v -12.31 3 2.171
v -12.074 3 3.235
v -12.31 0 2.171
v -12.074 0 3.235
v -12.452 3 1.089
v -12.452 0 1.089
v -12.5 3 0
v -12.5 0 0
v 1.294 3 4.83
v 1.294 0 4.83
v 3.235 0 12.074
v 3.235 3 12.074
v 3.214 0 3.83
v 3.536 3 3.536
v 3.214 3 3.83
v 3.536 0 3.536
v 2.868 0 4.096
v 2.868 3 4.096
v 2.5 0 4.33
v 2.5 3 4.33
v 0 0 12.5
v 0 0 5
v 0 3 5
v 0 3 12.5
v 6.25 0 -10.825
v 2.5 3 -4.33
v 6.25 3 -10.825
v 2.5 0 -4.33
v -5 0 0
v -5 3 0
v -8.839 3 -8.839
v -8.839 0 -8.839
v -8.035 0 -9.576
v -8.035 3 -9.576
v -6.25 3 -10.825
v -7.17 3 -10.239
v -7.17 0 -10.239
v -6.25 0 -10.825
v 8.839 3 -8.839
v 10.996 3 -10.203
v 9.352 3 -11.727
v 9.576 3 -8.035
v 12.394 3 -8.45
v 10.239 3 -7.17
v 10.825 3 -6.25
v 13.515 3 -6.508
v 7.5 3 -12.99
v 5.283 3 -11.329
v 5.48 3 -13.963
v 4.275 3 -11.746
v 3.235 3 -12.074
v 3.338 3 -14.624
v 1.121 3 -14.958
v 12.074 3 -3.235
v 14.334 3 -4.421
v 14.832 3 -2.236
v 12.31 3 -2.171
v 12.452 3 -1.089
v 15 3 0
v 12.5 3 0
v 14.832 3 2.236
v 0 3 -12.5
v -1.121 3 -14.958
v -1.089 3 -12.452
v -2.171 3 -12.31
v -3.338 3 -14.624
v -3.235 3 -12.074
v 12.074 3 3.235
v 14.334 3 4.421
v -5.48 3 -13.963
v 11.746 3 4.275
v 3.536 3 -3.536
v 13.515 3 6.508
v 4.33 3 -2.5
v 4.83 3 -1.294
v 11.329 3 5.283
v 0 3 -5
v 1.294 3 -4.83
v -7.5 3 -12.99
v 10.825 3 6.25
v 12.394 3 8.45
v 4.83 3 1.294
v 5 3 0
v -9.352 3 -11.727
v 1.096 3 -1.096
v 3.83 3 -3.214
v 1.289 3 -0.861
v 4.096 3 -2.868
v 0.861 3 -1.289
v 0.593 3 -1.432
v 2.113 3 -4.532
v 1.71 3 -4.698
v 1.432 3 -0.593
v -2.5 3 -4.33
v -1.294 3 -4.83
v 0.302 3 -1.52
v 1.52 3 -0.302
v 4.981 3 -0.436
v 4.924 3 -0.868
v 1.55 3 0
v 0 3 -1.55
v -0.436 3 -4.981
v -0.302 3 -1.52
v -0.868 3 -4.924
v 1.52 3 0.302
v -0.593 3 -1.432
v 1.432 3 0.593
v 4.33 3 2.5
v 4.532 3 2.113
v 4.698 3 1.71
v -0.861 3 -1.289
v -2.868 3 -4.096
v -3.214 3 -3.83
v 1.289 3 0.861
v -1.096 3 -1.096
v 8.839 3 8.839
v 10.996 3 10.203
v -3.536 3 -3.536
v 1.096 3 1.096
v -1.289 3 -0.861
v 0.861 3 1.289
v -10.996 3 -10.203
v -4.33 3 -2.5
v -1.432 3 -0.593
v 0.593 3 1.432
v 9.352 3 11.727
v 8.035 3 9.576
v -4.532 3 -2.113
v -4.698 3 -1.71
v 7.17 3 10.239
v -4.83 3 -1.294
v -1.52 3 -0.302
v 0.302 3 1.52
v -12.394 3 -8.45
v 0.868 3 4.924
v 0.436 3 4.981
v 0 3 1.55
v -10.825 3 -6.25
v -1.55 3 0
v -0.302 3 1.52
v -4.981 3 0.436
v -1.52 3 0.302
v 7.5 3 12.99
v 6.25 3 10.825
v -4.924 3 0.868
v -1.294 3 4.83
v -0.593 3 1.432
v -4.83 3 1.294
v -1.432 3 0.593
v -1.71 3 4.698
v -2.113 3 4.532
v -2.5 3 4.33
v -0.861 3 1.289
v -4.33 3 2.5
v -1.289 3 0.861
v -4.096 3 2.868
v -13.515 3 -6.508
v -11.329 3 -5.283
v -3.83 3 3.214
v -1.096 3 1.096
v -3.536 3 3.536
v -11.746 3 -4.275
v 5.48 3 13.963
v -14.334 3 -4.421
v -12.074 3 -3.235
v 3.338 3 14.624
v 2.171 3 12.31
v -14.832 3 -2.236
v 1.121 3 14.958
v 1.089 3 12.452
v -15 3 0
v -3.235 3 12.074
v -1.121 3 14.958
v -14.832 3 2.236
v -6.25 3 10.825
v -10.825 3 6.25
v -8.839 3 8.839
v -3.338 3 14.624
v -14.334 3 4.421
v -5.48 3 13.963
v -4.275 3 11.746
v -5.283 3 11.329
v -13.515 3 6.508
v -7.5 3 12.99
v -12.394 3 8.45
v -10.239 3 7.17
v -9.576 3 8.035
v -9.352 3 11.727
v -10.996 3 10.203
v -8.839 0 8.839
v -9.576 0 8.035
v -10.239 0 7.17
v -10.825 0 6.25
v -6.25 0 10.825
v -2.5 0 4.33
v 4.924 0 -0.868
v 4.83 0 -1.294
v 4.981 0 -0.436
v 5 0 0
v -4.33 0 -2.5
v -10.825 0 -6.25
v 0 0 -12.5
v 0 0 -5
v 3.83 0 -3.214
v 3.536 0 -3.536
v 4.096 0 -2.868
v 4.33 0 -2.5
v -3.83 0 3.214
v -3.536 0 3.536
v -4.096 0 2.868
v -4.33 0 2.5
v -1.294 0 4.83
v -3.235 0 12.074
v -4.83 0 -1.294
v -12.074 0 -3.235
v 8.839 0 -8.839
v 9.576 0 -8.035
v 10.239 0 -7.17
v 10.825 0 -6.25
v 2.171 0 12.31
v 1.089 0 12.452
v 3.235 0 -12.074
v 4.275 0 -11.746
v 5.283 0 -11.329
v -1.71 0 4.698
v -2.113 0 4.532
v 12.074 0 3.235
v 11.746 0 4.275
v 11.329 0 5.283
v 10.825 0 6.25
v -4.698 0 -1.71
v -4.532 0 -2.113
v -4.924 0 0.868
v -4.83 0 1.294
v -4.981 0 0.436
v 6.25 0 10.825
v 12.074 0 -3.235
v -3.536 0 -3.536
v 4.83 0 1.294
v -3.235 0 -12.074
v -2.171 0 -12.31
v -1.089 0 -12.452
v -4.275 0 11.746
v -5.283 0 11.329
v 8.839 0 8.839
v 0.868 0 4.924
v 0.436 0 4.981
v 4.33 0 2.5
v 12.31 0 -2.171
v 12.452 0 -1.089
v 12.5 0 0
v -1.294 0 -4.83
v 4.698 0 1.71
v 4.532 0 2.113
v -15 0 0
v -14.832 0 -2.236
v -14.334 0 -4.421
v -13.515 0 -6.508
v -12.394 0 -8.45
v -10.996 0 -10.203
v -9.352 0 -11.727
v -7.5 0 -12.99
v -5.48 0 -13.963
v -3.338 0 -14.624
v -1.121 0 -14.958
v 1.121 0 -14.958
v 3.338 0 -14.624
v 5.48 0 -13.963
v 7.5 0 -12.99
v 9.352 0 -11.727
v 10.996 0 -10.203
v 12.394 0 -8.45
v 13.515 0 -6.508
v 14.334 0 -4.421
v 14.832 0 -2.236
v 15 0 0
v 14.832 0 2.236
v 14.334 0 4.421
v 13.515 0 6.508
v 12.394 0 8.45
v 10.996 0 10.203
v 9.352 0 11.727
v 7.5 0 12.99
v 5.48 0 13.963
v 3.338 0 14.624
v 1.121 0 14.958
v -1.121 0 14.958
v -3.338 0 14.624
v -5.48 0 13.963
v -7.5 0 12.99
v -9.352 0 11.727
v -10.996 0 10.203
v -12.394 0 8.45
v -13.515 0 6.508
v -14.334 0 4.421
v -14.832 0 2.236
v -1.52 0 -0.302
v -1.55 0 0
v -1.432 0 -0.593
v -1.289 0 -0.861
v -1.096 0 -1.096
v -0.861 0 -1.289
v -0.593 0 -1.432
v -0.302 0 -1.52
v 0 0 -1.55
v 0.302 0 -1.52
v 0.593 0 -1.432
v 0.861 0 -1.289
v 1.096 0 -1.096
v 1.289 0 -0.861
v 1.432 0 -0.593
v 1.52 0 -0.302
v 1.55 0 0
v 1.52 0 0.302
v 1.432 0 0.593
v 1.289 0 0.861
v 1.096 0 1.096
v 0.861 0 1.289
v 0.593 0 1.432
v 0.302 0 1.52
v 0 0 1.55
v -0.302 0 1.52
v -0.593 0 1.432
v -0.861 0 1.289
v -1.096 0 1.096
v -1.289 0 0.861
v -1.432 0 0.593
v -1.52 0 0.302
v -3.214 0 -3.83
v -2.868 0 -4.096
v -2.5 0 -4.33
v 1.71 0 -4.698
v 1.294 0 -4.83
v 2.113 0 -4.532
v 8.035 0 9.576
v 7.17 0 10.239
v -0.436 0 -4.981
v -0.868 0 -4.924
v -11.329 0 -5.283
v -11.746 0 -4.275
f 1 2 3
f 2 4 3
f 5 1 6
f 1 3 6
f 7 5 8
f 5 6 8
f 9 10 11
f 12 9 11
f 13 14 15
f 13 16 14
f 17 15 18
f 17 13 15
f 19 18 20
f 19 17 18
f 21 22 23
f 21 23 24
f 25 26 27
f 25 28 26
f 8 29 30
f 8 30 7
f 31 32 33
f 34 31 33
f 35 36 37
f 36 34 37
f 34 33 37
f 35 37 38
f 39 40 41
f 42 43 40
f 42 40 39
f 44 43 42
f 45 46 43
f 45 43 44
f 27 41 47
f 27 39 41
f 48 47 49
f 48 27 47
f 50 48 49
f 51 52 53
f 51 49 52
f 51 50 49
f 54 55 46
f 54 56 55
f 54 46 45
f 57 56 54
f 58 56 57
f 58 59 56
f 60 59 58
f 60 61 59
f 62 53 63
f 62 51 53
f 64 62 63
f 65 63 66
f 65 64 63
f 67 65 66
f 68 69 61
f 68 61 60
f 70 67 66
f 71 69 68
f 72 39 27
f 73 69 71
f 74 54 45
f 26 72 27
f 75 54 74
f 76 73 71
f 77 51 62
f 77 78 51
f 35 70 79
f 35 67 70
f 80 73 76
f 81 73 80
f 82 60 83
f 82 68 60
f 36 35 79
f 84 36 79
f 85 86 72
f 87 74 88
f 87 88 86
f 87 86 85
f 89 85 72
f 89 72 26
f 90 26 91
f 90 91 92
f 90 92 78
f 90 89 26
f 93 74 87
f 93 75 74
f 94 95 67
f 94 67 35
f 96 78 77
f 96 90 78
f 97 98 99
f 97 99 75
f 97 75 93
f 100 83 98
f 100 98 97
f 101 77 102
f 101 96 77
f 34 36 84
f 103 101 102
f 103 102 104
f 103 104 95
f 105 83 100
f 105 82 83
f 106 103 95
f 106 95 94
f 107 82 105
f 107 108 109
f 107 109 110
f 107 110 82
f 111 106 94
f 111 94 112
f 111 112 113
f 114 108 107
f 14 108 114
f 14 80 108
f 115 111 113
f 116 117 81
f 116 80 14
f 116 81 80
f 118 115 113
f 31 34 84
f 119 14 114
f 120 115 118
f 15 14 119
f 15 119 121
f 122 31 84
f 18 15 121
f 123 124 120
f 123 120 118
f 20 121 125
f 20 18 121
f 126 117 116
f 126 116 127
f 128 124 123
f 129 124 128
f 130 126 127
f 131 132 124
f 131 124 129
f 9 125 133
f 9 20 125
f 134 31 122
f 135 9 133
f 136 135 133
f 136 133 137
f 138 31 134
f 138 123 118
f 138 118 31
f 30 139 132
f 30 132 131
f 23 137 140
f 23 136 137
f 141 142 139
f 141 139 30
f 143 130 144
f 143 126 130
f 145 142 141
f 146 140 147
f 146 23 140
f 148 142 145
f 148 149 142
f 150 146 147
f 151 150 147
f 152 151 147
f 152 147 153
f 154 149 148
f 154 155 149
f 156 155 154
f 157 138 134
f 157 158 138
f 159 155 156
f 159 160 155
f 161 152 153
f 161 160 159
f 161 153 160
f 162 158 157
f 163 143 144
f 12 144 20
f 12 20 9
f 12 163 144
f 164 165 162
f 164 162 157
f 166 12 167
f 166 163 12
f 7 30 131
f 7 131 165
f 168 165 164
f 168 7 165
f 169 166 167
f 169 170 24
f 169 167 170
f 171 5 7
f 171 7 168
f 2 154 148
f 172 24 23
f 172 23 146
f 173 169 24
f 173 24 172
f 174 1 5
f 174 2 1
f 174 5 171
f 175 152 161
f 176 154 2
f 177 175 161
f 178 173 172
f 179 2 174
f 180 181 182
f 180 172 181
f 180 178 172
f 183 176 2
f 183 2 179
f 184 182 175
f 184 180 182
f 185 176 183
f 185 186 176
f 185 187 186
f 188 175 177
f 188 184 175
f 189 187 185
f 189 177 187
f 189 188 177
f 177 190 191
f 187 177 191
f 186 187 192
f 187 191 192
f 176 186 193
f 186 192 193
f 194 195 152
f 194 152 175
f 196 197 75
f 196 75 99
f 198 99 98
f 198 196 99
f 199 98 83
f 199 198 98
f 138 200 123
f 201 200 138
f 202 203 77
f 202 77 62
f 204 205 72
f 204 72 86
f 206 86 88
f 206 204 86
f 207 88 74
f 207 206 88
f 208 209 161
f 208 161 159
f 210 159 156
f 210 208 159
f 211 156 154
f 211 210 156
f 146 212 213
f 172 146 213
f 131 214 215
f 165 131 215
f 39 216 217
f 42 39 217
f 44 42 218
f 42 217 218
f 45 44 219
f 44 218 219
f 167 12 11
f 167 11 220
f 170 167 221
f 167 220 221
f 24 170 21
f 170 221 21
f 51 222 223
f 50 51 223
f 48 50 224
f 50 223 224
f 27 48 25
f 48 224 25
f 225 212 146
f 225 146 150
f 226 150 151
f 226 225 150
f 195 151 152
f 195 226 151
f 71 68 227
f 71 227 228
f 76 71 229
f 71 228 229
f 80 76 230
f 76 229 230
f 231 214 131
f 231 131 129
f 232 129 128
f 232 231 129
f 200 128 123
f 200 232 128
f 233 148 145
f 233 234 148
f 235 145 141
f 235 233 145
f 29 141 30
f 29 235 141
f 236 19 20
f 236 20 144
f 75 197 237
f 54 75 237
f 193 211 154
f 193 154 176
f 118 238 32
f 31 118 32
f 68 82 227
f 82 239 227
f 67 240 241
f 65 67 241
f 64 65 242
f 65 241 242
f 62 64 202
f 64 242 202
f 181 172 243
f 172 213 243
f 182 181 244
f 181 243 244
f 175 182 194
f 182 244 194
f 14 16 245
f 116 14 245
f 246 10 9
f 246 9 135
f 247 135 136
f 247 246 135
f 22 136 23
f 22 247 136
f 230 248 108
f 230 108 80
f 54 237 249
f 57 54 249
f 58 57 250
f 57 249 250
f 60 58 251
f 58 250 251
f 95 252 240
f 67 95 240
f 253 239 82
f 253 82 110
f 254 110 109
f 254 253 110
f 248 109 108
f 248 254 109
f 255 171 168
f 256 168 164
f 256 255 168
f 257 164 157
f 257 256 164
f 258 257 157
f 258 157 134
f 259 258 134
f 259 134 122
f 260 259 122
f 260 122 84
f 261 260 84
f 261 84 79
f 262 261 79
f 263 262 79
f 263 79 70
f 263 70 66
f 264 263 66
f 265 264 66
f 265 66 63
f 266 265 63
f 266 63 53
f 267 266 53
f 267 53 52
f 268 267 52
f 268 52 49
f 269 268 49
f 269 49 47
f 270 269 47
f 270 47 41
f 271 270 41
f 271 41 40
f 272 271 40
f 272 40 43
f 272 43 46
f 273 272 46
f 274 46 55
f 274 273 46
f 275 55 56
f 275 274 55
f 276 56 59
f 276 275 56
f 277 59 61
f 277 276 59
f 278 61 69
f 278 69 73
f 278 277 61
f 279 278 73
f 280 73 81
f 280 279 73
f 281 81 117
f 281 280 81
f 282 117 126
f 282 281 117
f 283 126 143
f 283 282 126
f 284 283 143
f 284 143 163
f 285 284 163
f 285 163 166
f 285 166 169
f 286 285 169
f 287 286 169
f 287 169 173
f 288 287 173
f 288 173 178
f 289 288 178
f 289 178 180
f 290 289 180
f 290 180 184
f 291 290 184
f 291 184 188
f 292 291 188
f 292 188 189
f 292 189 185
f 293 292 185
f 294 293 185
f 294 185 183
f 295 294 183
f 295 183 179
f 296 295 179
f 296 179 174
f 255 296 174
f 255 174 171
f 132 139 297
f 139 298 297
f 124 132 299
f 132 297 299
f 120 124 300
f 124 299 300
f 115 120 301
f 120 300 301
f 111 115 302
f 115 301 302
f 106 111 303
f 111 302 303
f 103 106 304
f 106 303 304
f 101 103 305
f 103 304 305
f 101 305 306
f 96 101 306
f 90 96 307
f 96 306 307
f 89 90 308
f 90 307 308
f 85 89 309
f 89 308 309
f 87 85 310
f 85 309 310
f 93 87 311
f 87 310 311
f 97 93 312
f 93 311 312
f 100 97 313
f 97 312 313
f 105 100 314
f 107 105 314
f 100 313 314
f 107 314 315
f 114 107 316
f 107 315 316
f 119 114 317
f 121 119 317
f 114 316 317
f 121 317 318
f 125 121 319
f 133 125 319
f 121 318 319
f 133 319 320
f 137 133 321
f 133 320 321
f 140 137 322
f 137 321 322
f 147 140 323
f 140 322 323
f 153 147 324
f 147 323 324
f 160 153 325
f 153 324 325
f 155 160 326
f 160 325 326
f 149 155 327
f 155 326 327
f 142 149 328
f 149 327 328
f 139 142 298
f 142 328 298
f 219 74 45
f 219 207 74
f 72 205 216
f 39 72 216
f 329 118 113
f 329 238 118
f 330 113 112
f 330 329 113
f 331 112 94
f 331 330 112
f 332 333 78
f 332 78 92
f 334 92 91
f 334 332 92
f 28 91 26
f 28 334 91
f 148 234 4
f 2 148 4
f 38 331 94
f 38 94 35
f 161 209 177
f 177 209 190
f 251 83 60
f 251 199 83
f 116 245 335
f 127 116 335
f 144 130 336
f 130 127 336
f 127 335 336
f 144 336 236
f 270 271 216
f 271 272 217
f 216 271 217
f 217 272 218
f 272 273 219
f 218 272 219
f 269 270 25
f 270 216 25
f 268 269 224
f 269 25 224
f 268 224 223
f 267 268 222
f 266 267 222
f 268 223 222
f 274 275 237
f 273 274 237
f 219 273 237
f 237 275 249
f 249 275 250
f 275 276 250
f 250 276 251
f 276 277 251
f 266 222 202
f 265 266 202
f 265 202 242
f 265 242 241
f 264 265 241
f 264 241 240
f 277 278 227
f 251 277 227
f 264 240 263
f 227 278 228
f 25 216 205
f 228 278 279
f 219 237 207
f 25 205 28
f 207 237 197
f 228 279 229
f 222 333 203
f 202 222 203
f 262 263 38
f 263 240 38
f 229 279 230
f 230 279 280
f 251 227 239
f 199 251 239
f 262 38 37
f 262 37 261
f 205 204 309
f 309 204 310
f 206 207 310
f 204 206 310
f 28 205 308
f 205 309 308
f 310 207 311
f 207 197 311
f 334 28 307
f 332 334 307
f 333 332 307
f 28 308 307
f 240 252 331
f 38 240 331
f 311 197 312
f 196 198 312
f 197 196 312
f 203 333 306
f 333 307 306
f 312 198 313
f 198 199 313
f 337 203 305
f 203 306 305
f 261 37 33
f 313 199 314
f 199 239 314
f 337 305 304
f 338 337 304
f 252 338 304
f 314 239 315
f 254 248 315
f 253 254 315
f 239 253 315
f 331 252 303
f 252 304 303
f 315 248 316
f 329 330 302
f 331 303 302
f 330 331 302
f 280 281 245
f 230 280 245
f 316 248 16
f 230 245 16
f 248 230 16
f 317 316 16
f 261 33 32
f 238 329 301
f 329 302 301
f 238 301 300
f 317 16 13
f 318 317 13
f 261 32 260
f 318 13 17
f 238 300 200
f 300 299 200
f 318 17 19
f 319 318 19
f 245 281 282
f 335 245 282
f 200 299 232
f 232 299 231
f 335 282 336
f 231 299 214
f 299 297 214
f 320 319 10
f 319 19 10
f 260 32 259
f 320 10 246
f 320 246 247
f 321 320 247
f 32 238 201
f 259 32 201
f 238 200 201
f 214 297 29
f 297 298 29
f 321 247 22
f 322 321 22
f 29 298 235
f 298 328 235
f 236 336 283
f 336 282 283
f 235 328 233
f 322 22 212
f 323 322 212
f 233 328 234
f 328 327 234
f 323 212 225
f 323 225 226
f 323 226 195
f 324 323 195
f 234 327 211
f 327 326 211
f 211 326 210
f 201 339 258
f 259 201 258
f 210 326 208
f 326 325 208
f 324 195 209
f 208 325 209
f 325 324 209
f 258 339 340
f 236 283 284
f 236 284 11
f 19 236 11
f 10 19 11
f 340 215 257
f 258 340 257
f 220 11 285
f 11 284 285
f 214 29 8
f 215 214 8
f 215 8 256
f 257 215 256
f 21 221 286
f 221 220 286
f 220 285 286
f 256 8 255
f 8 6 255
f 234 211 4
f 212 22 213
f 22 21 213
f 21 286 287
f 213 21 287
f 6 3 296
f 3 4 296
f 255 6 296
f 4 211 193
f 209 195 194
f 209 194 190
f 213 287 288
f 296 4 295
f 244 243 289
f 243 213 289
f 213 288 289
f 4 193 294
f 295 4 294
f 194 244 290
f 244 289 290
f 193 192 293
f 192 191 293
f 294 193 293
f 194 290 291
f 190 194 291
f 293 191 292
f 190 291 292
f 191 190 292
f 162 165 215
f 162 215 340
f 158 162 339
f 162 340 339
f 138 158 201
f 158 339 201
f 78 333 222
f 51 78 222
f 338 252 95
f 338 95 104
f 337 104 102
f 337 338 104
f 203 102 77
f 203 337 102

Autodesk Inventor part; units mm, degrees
ref_plane "YZ Plane" through (0, 0, 0) normal (1, 0, 0) x (0, 1, 0)
ref_plane "XZ Plane" through (0, 0, 0) normal (0, 1, 0) x (-1, 0, 0)
ref_plane "XY Plane" through (0, 0, 0) normal (0, 0, 1) x (1, 0, 0)
sketch "草圖1" plane through (0, 0, 0) normal (0, 1, 0) x (-1, 0, 0)
  circle A0 centre (0, 0) radius 15
  line L0 (0, 0) -> (15, 0)
  line L1 (0, 0) -> (7.5, -12.9904)
  line L2 (0, 0) -> (12.9904, -7.5)
  circle A1 centre (0, 0) radius 12.5
  circle A2 centre (0, 0) radius 5
  circle A3 centre (0, 0) radius 1.55
  line L3 (0, 0) -> (10.6066, -10.6066)
  line L4 (0, 0) -> (14.4889, -3.8823)
  point P0 (6.25, -10.8253)
  point P1 (2.5, -4.3301)
  point P2 (4.3301, -2.5)
  point P3 (10.8253, -6.25)
  point P4 (12.0741, -3.2352)
  point P5 (4.8296, -1.2941)
  point P6 (8.8388, -8.8388)
  point P7 (3.5355, -3.5355)
  dimension "d0" = 30
  dimension "d1" = 60
  dimension "d2" = 30
  dimension "d3" = 25
  dimension "d4" = 10
  dimension "d12" = 3.1
  dimension "d15" = 15
  dimension "d16" = 15
extrude "擠出1" add sketch "草圖1" along normal blind 3
extrude "擠出2" cut sketch "草圖1" along normal blind 3 contours L1 A2 L3 A1 | A1 L2 A2 L4
pattern_circular "環形陣列1" count 6 over 360 about axis through (0, -10, 0) along (0, 1, 0) of "擠出2"
extrude "擠出3" cut sketch "草圖1" along normal blind 3 contours A3 L4 L0 | L0 L1 A3 | L1 L3 A3 | A3 L2 L4 | L2 A3 L3
properties part number "wheel_12_hollow"
